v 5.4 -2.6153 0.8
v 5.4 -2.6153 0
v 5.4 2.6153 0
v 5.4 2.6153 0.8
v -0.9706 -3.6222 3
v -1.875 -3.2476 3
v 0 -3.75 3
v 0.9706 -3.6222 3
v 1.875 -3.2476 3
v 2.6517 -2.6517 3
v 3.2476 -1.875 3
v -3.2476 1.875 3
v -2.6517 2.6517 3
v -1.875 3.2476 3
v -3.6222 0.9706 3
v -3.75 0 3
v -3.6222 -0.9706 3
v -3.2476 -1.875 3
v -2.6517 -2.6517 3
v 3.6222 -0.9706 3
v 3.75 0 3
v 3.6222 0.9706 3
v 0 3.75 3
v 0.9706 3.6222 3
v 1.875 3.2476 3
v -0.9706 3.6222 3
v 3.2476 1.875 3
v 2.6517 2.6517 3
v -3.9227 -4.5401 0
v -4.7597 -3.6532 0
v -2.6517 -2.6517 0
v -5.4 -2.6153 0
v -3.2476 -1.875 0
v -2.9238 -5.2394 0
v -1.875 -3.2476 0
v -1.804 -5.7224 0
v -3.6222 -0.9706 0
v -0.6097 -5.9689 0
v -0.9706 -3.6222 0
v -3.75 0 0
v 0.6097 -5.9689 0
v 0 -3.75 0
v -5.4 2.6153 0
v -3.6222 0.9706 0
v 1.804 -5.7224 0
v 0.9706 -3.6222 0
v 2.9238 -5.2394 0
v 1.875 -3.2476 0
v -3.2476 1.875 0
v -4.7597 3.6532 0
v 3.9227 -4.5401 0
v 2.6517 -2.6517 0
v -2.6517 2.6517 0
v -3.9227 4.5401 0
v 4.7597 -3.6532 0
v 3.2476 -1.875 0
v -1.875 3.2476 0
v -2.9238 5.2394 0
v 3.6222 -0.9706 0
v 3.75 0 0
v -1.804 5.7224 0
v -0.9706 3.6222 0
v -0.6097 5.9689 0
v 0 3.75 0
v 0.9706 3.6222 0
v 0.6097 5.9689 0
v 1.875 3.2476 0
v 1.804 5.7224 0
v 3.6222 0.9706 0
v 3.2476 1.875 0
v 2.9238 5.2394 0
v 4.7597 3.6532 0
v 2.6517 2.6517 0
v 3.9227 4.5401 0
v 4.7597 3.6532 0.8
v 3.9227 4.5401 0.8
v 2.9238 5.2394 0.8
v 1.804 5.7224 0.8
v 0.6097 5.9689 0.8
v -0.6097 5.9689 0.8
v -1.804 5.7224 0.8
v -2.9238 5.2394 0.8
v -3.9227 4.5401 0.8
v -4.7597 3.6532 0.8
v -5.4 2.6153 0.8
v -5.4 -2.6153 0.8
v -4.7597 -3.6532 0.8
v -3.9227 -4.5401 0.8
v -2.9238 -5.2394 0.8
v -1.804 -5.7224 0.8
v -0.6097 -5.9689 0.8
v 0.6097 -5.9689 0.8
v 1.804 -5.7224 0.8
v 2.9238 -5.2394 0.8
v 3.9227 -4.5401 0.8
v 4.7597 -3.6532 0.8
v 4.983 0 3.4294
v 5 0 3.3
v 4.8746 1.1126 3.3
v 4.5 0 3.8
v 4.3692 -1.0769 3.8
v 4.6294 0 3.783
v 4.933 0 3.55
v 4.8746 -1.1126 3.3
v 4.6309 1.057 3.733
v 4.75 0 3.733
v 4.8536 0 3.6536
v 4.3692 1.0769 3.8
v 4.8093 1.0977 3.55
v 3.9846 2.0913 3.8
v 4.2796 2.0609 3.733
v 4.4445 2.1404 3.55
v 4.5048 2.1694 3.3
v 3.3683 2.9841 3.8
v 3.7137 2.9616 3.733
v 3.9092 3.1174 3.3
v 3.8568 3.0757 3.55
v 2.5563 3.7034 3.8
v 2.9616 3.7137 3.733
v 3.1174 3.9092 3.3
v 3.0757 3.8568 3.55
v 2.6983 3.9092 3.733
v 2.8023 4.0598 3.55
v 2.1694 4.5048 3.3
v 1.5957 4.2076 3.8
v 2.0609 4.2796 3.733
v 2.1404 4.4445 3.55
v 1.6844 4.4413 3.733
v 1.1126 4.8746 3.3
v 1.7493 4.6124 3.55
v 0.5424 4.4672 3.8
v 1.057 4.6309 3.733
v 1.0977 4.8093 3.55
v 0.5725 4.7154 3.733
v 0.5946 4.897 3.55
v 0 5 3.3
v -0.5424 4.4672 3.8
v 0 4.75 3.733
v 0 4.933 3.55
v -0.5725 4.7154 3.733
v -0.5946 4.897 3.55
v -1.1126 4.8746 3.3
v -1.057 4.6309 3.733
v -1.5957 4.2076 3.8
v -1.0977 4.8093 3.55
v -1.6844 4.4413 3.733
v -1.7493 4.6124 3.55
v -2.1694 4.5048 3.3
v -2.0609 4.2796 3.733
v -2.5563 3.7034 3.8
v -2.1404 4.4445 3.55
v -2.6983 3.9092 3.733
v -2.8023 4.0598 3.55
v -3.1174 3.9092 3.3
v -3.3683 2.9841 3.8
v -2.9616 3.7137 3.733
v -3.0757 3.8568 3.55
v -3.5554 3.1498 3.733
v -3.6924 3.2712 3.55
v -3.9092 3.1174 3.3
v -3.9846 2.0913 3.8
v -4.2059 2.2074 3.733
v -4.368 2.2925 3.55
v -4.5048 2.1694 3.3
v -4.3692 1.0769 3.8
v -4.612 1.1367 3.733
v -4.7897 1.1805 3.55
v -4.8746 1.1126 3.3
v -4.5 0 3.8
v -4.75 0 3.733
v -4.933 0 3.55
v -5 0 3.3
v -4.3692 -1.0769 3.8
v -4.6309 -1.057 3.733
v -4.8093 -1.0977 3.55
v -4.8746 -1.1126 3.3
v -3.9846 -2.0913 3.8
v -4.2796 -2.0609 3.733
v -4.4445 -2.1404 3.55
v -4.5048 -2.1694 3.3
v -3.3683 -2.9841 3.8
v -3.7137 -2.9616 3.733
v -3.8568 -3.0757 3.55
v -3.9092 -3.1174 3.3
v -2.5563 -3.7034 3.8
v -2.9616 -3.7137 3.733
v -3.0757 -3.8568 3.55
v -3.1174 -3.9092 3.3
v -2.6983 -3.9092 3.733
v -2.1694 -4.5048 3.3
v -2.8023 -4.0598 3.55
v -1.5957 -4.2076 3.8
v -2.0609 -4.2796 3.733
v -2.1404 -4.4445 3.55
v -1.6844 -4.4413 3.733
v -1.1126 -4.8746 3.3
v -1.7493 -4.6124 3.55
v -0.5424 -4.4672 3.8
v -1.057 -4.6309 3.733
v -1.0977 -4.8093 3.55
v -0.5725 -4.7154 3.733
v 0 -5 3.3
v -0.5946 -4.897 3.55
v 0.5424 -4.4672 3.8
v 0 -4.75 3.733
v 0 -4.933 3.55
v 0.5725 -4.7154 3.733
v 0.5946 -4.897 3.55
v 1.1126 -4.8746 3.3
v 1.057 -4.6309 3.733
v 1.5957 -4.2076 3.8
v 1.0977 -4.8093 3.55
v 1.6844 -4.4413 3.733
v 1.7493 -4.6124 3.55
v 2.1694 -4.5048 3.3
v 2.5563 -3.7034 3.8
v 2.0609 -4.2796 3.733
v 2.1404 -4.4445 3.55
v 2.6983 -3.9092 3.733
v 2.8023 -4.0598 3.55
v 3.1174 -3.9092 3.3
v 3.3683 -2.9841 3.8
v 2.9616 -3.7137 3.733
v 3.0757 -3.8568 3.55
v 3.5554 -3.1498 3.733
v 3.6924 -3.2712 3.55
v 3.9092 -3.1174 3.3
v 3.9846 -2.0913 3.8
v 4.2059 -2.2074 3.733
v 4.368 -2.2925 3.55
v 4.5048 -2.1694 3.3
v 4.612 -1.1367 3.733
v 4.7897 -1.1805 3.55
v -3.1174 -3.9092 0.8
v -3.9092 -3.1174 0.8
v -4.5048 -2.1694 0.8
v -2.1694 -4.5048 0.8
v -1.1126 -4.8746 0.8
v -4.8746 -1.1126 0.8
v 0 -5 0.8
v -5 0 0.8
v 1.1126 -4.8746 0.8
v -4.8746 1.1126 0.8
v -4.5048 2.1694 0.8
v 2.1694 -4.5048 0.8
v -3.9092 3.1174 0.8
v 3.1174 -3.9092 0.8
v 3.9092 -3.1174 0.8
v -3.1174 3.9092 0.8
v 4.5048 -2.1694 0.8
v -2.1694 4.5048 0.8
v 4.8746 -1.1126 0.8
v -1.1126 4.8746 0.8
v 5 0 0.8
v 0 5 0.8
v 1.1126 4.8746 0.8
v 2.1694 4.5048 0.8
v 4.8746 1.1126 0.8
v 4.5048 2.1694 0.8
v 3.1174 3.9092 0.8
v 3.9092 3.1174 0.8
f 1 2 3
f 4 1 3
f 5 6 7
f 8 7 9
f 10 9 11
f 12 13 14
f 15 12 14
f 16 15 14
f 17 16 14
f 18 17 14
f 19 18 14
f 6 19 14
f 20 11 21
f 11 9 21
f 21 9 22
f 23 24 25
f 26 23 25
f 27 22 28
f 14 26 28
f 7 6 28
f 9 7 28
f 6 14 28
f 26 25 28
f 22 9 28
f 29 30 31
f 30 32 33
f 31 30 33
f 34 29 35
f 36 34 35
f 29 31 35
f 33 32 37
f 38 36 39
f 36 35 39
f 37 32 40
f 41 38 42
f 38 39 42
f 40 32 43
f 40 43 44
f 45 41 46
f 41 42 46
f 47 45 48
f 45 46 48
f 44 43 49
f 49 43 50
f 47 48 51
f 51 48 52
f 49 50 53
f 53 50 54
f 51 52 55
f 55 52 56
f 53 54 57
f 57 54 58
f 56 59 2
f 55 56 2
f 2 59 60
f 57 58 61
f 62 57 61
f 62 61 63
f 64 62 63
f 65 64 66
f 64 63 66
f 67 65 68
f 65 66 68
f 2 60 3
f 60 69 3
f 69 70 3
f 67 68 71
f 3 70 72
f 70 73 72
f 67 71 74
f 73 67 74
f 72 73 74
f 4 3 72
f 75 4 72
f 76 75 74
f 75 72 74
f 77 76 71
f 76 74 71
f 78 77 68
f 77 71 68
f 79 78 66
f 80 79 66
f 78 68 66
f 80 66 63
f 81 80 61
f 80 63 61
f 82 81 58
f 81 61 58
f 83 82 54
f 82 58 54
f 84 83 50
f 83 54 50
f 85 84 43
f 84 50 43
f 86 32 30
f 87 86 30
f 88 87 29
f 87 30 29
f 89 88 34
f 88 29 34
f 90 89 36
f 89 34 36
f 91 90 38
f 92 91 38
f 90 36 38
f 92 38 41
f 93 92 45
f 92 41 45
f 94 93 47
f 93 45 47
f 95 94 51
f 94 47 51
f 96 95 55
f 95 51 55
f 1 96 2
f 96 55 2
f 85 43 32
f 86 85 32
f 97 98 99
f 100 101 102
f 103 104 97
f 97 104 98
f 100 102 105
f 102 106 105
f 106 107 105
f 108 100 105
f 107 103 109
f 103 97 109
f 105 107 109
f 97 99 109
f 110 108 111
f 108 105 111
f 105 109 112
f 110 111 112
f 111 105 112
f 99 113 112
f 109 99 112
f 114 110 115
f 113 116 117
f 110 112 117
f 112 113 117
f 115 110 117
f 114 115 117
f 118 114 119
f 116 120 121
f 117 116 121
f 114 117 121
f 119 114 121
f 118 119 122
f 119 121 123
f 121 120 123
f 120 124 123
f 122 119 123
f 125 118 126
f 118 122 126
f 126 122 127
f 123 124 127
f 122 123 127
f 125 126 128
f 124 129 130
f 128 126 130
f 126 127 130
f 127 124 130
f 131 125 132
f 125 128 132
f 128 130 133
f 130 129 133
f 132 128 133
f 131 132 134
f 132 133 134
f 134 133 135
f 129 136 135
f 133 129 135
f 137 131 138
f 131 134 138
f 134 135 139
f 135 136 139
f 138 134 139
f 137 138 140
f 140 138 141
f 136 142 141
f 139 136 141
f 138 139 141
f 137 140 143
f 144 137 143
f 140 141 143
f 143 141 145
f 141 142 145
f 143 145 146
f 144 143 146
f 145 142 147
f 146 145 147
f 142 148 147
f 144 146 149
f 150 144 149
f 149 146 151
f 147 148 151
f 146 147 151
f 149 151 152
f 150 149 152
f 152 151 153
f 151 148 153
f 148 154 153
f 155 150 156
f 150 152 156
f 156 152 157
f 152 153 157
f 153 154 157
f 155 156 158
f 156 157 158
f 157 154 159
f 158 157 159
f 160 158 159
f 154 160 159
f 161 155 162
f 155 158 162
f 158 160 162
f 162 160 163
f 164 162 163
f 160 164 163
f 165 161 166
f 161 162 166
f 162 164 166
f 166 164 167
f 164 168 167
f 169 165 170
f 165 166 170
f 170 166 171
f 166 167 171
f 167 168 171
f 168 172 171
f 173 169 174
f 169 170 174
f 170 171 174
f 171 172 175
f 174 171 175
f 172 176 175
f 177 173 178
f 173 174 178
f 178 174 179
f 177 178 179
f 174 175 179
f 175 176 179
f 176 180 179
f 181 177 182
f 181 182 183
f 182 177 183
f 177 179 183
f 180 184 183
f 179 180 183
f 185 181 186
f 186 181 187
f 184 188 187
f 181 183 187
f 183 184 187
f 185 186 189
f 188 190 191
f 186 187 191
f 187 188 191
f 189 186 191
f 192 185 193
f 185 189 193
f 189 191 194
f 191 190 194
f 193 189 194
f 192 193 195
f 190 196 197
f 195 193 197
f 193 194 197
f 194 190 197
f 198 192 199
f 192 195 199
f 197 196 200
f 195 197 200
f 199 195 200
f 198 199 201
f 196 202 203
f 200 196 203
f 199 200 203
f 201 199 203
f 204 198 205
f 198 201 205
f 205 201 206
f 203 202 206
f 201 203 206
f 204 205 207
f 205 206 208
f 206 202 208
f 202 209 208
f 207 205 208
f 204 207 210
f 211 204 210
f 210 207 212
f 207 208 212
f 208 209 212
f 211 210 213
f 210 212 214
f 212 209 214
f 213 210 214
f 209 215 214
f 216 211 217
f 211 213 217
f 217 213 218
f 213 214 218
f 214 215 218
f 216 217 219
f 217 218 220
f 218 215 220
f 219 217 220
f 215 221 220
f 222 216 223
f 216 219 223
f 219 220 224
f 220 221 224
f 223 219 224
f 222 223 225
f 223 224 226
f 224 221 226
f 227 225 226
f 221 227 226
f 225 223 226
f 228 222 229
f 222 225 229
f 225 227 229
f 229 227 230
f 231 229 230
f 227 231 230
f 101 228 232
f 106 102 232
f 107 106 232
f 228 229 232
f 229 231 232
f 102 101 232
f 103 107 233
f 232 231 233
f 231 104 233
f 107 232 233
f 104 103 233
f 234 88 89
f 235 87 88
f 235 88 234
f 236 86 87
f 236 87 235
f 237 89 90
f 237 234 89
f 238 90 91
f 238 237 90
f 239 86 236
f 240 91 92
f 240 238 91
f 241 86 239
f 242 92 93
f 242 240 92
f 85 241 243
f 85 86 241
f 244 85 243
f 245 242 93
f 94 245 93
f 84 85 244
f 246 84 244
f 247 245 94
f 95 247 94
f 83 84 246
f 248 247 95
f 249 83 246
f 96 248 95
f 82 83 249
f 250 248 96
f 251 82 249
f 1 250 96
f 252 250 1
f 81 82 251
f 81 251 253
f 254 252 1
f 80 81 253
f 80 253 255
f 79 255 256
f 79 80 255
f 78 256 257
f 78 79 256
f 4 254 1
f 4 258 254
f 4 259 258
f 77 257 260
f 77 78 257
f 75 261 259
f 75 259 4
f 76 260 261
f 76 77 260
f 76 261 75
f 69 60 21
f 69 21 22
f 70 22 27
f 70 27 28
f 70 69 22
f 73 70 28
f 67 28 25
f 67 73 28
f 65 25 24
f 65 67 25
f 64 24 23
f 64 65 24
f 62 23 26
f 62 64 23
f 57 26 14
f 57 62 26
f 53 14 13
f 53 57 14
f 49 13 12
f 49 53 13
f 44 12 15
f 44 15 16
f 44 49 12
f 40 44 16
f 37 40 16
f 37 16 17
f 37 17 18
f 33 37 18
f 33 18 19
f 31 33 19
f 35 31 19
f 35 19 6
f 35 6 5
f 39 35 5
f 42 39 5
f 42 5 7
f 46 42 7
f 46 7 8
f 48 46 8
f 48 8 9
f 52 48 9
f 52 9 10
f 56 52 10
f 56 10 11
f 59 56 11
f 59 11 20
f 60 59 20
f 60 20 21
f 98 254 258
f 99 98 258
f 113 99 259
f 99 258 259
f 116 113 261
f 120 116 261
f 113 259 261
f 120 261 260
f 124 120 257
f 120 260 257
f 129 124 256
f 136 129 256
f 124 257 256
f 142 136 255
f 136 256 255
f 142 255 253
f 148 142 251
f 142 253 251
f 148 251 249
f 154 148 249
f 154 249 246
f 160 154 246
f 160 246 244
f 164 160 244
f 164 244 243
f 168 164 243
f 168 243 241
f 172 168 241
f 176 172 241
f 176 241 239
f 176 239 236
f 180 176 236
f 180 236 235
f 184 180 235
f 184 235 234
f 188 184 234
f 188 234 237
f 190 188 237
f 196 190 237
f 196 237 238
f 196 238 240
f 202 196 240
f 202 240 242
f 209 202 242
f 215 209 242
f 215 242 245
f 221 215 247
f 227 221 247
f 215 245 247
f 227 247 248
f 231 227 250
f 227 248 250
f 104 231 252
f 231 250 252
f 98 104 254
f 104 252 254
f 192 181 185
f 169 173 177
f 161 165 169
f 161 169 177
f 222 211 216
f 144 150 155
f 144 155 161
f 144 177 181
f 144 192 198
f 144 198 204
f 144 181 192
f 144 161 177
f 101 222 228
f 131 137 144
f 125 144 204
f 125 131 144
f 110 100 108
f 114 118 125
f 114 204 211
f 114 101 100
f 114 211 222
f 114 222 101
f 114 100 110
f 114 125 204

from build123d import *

# Parameters (mm, degrees)
SKETCH_2_R      = 5
EXTRUDE_1_DEPTH = 0.8
SKETCH_2_3_R    = 5
SKETCH_2_3_R_2  = 3.75
EXTRUDE_2_DEPTH = 3.8
SKETCH_3_R      = 3.75
EXTRUDE_3_DEPTH = 0.8
FILLET_1_R      = 0.5


with BuildPart() as part:
    # Sketch 2 → Extrude 1 (new body)
    with BuildSketch(Plane.XY):
        with BuildLine():
            Line((-5.4, 2.615339366), (-5.4, -2.615339366))
            ThreePointArc((-5.4, -2.615339366), (0, -6), (5.4, -2.615339366))
            Line((5.4, -2.615339366), (5.4, 2.615339366))
            ThreePointArc((5.4, 2.615339366), (0, 6), (-5.4, 2.615339366))
        make_face()
        Circle(SKETCH_2_R, mode=Mode.SUBTRACT)
    extrude(amount=EXTRUDE_1_DEPTH)

    # Sketch 2_3 → Extrude 2 (add)
    with BuildSketch(Plane.XY):
        Circle(SKETCH_2_3_R)
        Circle(SKETCH_2_3_R_2, mode=Mode.SUBTRACT)
    extrude(amount=EXTRUDE_2_DEPTH)

    # Sketch 3 → Extrude 3 (add)
    with BuildSketch(Plane.XY.offset(3.8)):
        Circle(SKETCH_3_R)
    extrude(amount=-EXTRUDE_3_DEPTH)

    # Fillet 1
    fillet_1_edges = [part.edges().sort_by_distance(p)[0] for p in [
        (-5, 0, 3.8),
    ]]
    fillet(fillet_1_edges, radius=FILLET_1_R)


solid = part.part
